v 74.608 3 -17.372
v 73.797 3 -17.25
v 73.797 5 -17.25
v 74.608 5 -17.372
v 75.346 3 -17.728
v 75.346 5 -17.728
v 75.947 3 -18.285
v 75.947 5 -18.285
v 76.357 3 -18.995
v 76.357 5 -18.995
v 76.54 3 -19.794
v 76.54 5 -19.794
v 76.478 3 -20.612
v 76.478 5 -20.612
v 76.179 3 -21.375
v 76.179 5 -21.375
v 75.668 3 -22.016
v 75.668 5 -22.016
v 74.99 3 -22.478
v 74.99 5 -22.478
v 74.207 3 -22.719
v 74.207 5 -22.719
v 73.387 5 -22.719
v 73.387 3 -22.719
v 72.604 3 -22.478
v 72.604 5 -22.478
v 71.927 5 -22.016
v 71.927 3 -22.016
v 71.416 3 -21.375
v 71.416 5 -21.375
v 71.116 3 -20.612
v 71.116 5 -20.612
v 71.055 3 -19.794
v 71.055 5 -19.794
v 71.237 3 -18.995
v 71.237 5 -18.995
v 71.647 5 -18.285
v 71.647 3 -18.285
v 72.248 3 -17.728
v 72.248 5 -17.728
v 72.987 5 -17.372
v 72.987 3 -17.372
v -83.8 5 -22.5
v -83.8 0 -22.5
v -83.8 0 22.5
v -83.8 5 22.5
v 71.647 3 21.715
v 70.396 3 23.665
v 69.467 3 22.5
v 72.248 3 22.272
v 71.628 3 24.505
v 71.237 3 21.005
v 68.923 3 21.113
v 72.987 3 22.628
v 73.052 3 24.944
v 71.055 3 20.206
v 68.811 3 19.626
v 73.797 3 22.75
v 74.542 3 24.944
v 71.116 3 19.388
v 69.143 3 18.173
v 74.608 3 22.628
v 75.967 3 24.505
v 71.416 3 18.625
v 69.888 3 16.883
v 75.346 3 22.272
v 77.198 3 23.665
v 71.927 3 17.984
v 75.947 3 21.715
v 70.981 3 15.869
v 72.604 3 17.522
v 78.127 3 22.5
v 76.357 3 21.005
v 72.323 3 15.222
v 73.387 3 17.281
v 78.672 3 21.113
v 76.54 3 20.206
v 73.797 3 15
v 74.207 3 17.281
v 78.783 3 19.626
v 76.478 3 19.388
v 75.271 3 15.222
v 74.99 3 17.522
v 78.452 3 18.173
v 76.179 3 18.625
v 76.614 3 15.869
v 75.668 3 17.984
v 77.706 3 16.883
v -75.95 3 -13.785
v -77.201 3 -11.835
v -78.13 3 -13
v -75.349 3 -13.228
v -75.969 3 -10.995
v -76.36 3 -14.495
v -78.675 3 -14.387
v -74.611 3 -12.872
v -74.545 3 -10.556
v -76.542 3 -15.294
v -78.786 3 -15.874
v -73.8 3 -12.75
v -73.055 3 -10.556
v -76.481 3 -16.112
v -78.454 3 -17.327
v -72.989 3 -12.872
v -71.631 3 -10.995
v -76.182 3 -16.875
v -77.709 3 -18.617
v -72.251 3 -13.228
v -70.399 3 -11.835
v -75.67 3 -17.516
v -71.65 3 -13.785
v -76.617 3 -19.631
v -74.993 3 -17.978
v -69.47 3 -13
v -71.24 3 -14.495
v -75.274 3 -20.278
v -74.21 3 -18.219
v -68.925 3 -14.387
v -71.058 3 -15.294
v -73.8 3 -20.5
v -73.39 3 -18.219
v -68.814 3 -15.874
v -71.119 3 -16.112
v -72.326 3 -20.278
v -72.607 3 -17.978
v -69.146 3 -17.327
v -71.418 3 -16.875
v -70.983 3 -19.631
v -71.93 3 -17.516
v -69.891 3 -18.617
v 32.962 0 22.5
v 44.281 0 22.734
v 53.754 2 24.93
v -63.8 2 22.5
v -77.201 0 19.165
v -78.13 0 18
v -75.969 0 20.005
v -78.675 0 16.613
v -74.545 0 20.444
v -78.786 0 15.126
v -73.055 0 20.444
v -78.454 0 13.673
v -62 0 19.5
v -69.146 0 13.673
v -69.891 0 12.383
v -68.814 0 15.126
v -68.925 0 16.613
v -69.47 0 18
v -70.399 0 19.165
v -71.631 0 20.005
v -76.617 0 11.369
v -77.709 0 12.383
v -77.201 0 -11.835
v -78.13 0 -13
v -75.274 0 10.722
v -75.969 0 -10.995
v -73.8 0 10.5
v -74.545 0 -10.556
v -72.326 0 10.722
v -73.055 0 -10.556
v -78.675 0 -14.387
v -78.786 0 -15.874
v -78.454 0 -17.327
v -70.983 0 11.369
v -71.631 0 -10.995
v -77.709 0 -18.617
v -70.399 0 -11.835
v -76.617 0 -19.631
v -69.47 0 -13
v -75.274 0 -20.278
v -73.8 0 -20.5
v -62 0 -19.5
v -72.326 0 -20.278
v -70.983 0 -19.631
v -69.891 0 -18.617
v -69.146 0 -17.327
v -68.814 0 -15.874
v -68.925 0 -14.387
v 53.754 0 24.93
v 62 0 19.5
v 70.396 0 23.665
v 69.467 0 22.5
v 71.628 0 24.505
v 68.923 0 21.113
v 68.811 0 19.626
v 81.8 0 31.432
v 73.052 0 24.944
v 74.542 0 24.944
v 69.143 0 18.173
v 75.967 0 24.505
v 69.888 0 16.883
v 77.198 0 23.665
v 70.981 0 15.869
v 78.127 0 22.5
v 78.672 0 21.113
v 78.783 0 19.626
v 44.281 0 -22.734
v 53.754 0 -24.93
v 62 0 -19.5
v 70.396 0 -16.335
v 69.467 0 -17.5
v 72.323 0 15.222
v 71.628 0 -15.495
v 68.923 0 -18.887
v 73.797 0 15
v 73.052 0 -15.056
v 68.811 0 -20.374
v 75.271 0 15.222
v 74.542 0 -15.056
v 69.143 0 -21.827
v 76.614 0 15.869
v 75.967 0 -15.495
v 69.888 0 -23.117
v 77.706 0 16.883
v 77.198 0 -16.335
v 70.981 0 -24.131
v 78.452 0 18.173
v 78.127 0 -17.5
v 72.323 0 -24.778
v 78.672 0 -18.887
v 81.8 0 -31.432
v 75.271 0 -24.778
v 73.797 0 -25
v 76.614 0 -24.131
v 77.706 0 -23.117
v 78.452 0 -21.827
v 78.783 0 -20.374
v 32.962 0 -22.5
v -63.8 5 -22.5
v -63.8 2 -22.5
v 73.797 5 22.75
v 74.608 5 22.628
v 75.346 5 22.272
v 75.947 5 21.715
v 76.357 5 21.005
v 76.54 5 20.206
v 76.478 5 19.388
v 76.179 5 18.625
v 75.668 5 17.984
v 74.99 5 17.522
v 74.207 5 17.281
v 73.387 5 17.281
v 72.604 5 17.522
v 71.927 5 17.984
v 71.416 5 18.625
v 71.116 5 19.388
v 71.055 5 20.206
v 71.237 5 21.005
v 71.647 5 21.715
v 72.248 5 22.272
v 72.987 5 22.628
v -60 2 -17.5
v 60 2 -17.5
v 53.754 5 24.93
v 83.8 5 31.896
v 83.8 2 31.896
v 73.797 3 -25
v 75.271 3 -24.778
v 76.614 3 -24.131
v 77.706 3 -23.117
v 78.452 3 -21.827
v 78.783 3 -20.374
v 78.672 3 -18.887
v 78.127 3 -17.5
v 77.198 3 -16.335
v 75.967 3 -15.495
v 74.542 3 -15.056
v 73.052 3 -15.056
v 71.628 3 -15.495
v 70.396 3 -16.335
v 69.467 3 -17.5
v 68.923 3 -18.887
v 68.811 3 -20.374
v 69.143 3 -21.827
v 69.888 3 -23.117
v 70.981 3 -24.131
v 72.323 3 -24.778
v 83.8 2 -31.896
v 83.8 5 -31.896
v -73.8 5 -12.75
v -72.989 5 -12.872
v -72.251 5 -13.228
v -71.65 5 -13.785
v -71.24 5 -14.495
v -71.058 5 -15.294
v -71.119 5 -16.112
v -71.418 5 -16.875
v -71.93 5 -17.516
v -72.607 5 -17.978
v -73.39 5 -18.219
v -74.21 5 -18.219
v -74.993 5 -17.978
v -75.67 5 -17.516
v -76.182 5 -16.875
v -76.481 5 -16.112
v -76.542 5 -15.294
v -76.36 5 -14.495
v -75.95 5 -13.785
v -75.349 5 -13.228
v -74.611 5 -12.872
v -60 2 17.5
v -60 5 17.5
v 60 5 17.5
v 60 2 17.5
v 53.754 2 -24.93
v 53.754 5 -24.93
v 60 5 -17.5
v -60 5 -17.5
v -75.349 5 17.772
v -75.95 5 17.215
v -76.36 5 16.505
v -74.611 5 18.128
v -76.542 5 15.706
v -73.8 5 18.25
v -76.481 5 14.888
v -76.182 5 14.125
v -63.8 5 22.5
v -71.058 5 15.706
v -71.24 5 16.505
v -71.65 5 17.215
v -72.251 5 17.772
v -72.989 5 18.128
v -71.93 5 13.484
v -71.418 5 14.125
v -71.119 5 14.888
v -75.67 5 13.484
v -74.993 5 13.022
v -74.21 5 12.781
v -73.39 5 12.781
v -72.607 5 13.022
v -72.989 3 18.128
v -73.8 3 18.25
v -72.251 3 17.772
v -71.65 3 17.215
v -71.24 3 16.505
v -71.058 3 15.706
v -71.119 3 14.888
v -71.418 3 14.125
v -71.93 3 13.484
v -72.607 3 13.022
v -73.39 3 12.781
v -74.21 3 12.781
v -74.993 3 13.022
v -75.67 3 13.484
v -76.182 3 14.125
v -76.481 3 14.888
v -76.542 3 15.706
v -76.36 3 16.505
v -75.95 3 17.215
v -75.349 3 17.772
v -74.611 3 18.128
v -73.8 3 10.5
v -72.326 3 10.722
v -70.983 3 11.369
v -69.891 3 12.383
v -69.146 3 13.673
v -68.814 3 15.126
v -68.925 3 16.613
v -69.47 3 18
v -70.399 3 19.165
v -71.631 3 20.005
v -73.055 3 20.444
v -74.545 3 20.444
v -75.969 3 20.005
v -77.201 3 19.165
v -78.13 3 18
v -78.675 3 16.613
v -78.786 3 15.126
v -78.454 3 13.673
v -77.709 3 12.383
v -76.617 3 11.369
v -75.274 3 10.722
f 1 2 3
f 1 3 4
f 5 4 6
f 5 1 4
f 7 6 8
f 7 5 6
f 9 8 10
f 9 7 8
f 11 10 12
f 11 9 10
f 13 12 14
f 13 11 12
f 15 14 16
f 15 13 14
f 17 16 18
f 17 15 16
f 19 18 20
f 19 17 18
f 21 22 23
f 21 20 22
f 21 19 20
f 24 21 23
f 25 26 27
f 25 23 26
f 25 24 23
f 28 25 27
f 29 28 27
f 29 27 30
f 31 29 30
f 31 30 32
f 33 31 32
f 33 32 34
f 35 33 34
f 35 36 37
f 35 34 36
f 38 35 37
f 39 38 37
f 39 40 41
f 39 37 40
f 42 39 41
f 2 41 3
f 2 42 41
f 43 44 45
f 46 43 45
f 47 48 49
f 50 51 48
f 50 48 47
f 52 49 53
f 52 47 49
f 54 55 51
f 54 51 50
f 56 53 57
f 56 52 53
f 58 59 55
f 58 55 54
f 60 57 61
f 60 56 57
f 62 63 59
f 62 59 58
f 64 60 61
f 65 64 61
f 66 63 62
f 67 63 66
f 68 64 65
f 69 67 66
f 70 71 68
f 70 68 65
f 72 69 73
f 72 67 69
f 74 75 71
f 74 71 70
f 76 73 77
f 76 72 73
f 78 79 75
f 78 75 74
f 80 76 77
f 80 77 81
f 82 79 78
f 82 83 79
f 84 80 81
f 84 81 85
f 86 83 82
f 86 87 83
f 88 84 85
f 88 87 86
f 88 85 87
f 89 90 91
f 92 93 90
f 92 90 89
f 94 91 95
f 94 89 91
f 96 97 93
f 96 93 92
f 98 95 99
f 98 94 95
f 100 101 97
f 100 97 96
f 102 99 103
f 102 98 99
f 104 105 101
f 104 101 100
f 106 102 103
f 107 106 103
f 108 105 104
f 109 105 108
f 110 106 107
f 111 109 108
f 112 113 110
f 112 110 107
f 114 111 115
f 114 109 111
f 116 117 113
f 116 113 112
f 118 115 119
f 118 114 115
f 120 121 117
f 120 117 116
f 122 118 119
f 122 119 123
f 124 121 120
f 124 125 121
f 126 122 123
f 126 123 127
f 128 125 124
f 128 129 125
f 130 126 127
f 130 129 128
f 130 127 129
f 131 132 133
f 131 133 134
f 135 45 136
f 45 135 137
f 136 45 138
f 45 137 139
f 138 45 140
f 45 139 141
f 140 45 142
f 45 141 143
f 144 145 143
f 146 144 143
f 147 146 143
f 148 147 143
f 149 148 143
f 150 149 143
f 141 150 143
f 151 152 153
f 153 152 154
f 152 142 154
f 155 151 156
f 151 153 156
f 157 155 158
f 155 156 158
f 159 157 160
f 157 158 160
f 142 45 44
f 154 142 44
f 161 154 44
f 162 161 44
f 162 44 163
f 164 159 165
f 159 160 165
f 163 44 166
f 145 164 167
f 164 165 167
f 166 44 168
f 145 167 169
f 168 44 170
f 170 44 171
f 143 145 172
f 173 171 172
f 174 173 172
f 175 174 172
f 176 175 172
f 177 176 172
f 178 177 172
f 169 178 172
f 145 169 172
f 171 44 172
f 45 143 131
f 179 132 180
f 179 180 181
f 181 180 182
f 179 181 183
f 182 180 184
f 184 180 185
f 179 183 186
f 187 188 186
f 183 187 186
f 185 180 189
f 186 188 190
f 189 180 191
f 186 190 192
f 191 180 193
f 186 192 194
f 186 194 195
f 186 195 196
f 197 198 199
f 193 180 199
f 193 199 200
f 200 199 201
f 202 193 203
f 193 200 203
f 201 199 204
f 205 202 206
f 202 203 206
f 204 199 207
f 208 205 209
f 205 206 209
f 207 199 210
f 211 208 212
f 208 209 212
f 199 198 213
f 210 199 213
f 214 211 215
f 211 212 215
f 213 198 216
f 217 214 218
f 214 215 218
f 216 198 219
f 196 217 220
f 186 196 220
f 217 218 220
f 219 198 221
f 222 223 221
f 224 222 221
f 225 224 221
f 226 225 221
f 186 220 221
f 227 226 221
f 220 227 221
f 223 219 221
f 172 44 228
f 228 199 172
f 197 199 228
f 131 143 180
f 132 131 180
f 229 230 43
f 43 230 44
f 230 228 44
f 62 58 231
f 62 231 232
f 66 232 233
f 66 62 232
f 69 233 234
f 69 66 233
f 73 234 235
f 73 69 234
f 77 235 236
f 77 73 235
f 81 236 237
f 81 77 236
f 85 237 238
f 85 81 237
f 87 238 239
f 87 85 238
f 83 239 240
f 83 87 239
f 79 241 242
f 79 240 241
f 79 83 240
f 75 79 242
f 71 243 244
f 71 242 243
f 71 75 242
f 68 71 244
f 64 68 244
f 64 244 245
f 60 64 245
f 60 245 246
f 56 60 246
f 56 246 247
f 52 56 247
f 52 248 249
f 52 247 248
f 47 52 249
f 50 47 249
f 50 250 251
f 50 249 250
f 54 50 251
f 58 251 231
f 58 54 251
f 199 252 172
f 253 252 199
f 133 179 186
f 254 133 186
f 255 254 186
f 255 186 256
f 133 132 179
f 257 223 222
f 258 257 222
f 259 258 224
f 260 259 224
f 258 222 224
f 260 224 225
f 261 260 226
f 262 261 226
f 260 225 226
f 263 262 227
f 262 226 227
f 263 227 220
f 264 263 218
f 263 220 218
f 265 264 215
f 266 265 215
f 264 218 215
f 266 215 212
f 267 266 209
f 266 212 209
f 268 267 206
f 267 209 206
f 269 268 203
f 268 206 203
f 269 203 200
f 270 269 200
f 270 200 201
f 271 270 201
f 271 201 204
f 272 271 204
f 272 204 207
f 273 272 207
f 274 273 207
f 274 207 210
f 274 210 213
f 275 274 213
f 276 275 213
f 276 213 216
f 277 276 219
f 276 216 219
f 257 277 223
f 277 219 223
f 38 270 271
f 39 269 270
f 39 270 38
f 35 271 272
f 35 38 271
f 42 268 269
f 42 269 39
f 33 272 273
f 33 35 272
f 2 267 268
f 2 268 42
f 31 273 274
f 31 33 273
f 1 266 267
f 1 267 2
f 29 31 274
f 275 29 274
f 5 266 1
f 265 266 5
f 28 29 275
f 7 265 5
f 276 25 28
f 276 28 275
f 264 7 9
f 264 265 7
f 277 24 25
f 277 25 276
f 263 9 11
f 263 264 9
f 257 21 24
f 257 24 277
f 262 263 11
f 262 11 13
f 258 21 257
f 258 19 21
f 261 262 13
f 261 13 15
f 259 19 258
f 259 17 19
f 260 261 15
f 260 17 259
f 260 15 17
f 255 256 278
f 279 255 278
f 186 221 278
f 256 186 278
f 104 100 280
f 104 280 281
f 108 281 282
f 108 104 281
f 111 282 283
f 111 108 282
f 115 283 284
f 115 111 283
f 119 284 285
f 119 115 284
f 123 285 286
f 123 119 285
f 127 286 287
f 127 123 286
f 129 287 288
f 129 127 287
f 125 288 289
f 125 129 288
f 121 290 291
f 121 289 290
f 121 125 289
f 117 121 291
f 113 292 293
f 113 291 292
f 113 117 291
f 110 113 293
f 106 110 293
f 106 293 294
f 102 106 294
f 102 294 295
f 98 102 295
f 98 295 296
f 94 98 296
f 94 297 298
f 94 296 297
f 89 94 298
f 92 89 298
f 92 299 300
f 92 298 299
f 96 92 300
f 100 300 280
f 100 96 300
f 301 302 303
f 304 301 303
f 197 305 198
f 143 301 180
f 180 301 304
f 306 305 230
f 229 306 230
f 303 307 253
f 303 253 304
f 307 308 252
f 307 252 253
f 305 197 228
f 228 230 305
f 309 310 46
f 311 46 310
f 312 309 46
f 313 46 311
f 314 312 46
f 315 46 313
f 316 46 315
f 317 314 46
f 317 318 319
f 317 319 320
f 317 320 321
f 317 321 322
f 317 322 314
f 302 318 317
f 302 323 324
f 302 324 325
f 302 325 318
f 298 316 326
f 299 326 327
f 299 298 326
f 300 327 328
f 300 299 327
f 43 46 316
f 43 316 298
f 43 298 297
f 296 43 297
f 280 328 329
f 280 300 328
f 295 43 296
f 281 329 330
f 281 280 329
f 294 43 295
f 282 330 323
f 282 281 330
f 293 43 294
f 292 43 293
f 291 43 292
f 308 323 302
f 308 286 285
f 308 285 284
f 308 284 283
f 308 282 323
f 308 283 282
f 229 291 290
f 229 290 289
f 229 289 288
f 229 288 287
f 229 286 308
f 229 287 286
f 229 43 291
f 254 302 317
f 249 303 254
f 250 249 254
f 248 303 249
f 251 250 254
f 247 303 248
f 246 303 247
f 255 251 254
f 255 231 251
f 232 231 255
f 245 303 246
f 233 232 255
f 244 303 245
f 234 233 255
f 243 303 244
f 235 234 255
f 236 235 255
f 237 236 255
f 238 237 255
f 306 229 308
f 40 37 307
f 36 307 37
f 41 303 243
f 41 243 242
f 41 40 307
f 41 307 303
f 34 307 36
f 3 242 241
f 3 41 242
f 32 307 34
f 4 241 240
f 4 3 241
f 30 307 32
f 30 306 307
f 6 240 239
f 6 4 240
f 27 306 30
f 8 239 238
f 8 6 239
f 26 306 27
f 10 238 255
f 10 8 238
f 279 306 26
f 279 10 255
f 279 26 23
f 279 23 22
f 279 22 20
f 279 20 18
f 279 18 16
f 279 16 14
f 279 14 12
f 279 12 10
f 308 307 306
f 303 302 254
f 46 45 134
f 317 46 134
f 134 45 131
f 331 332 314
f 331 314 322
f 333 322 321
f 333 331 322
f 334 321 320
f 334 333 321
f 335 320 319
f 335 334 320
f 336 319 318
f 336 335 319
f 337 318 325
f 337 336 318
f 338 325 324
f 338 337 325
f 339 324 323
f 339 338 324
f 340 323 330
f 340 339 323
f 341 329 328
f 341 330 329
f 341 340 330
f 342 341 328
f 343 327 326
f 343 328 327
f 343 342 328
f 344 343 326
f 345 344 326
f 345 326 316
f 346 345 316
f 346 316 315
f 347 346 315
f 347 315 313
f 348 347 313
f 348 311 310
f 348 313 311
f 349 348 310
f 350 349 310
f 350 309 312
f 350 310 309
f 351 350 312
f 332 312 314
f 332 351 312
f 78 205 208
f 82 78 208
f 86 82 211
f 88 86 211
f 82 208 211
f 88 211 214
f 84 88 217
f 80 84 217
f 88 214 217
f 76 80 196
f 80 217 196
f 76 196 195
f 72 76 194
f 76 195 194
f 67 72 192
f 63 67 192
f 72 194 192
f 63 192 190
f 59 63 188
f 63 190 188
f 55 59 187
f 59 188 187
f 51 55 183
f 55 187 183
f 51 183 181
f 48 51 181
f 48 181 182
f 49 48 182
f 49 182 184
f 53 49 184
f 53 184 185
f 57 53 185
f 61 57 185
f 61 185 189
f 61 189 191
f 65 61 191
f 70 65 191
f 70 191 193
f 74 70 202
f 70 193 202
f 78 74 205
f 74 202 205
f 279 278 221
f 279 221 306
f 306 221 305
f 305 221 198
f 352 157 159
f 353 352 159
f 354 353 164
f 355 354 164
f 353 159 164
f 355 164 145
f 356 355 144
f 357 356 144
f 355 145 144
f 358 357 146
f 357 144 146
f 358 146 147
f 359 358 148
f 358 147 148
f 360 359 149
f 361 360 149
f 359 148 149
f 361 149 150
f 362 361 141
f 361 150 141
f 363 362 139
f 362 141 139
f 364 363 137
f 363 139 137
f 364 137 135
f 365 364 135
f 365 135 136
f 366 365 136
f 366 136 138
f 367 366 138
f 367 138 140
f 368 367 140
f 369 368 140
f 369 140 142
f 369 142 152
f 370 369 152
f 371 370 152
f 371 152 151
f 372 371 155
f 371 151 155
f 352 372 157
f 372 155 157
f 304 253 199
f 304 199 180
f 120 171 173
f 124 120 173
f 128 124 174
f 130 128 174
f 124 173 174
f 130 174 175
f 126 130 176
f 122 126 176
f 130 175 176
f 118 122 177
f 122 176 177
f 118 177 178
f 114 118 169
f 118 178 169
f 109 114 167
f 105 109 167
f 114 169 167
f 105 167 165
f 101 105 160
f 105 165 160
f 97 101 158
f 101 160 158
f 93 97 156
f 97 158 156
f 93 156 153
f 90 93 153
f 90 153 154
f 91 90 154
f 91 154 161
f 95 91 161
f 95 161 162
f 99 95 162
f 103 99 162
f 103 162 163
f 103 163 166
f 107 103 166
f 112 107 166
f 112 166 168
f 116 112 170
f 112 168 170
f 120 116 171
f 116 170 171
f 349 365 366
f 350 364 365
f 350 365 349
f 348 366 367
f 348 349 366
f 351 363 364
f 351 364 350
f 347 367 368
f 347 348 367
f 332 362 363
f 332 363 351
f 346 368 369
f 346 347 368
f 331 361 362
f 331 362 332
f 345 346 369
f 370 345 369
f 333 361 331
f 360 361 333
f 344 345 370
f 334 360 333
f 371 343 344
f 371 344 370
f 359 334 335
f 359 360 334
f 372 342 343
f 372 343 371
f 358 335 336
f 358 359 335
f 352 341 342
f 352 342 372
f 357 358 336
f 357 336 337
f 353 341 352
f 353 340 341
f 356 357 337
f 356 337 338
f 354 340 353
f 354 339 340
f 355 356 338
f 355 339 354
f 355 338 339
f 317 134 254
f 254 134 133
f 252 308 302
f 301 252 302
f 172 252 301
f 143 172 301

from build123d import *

# Parameters (mm, degrees)
BOSS_EXTRUDE1_DEPTH     = 5
CUT_EXTRUDE1_DEPTH      = 92.215662378
CUT_EXTRUDE1_DEPTH_BACK = 92.215662378
SKETCH2_R               = 2.75
CUT_EXTRUDE2_DEPTH      = 92.215662378
CUT_EXTRUDE2_DEPTH_BACK = 92.215662378
CHAMFER3_SIZE           = 2
CUT_EXTRUDE3_DEPTH      = 90.804241831
CUT_EXTRUDE3_DEPTH_BACK = 90.804241831
SKETCH4_W               = 120
SKETCH4_H               = 35
CHAMFER4_SIZE           = 2
SKETCH5_R               = 5
CUT_EXTRUDE4_DEPTH      = 3


with BuildPart() as part:
    # Sketch1 → Boss-Extrude1 (new body)
    with BuildSketch(Plane(origin=(0, 0, 0), x_dir=(1, 0, 0), z_dir=(0, 1, 0))):
        Polygon((-73.8, 35.677122405), (-83.8, 35.677122405), (-83.8, -35.677122405), (-73.8, -35.677122405), (73.8, -35.677122405), (83.8, -35.677122405), (83.8, 35.677122405), (73.8, 35.677122405), align=None)
    extrude(amount=BOSS_EXTRUDE1_DEPTH)

    # Sketch2 → Cut-Extrude1 (cut, two sides: drawn at the far end of the back side and taken through both)
    with BuildSketch(Plane(origin=(0, 5, 0), x_dir=(1, 0, 0), z_dir=(0, 1, 0)).offset(-CUT_EXTRUDE1_DEPTH_BACK)):
        with Locations(Location((-73.8, -15.5, 0), (0, 0, 270))):
            Circle(SKETCH2_R)
        with Locations(Location((-73.8, 15.5, 0), (0, 0, 270))):
            Circle(SKETCH2_R)
        with Locations(Location((73.797239672, -20, 0), (0, 0, 270))):
            Circle(SKETCH2_R)
        with Locations(Location((73.797239672, 20, 0), (0, 0, 270))):
            Circle(SKETCH2_R)
    extrude(amount=CUT_EXTRUDE1_DEPTH + CUT_EXTRUDE1_DEPTH_BACK, mode=Mode.SUBTRACT)

    # Sketch3 → Cut-Extrude2 (cut, two sides: drawn at the far end of the back side and taken through both)
    with BuildSketch(Plane(origin=(0, 5, 0), x_dir=(1, 0, 0), z_dir=(0, 1, 0)).offset(-CUT_EXTRUDE2_DEPTH_BACK)):
        Polygon((-63.8, -22.5), (53.754373535, -24.93027399), (90.089947098, -33.354383806), (45.106765394, -114.519737278), (-93.808894925, -48.481732373), (-93.808894925, -22.5), align=None)
        Polygon((53.754373535, 24.93027399), (-63.8, 22.5), (-93.808894925, 22.5), (-93.808894925, 75.103676807), (90.089947098, 109.537779365), (90.089947098, 33.354383806), align=None)
    extrude(amount=CUT_EXTRUDE2_DEPTH + CUT_EXTRUDE2_DEPTH_BACK, mode=Mode.SUBTRACT)

    # Chamfer3
    # the kernel refuses this chamfer: 2 mm, written as the material it takes off along each edge
    with BuildSketch(Plane(origin=(83.8, 0, 37.039476252), x_dir=(-0.9996219169112968, -0.027495876610586292, 0), z_dir=(0, 0, -1))) as chamfer3_piece_1:
        Polygon((CHAMFER3_SIZE * 0.999621916911, CHAMFER3_SIZE * 0.0274958766106), (-CHAMFER3_SIZE * 0.0274958766106, CHAMFER3_SIZE * 0.999621916911), (0, 0), align=None)
    extrude(amount=74.078952505, mode=Mode.SUBTRACT)
    with BuildSketch(Plane(origin=(58.89664073, 0, 25.036583248), x_dir=(0.020661384909083567, -0.027495876610586414, -0.9994083669566981), z_dir=(-0.9997863692752371, 0, -0.020669199583903272))) as chamfer3_piece_2_section:
        Polygon((CHAMFER3_SIZE * 0.999621916911, -CHAMFER3_SIZE * 0.0274958766106), (-CHAMFER3_SIZE * 0.0274958766106, -CHAMFER3_SIZE * 0.999621916911), (0, 0), align=None)
    chamfer3_piece_2 = extrude(amount=127.866224079, mode=Mode.PRIVATE)
    chamfer3_piece_2 = split(chamfer3_piece_2, bisect_by=Plane(origin=(6.389506061, 0.738517017, 22.5), z_dir=(0, 0, 1)), keep=Keep.TOP, mode=Mode.PRIVATE)
    chamfer3_piece_2 = split(chamfer3_piece_2, bisect_by=Plane(origin=(8.475011093, 0.738517017, 14.432618822), z_dir=(-0.22585154444898248, 0, 0.9741617318854243)), keep=Keep.TOP, mode=Mode.PRIVATE)
    add(chamfer3_piece_2, mode=Mode.SUBTRACT)
    with BuildSketch(Plane(origin=(-68.942267195, 0, -22.393690742), x_dir=(0.020661384909228912, -0.027495876610586358, 0.9994083669566951), z_dir=(0.9997863692752341, 0, -0.02066919958404867))) as chamfer3_piece_3_section:
        Polygon((CHAMFER3_SIZE * 0.999621916911, -CHAMFER3_SIZE * 0.0274958766106), (-CHAMFER3_SIZE * 0.0274958766106, -CHAMFER3_SIZE * 0.999621916911), (0, 0), align=None)
    chamfer3_piece_3 = extrude(amount=127.866224079, mode=Mode.PRIVATE)
    chamfer3_piece_3 = split(chamfer3_piece_3, bisect_by=Plane(origin=(6.389506061, 0.738517017, -22.5), z_dir=(0, 0, -1)), keep=Keep.TOP, mode=Mode.PRIVATE)
    chamfer3_piece_3 = split(chamfer3_piece_3, bisect_by=Plane(origin=(8.475011093, 0.738517017, -14.432618822), z_dir=(-0.22585154444898248, 0, -0.9741617318854243)), keep=Keep.TOP, mode=Mode.PRIVATE)
    add(chamfer3_piece_3, mode=Mode.SUBTRACT)

    # Sketch4 → Cut-Extrude3 (cut, two sides: drawn at the far end of the back side and taken through both)
    with BuildSketch(Plane.XZ.offset(-CUT_EXTRUDE3_DEPTH_BACK)):
        Rectangle(SKETCH4_W, SKETCH4_H)
    extrude(amount=CUT_EXTRUDE3_DEPTH + CUT_EXTRUDE3_DEPTH_BACK, mode=Mode.SUBTRACT)

    # Chamfer4
    chamfer4_edges = [part.edges().sort_by_distance(p)[0] for p in [
        (0, 0, -17.5),
        (60, 0, 0),
        (0, 0, 17.5),
        (-60, 0, 0),
    ]]
    chamfer(chamfer4_edges, length=CHAMFER4_SIZE)

    # Sketch5 → Cut-Extrude4 (cut)
    with BuildSketch(Plane.XZ):
        with Locations(Location((-73.8, 15.5, 0), (0, 0, 270))):
            Circle(SKETCH5_R)
        with Locations(Location((-73.8, -15.5, 0), (0, 0, 270))):
            Circle(SKETCH5_R)
        with Locations(Location((73.797239672, 20, 0), (0, 0, 270))):
            Circle(SKETCH5_R)
        with Locations(Location((73.797239672, -20, 0), (0, 0, 270))):
            Circle(SKETCH5_R)
    extrude(amount=-CUT_EXTRUDE4_DEPTH, mode=Mode.SUBTRACT)


solid = part.part
